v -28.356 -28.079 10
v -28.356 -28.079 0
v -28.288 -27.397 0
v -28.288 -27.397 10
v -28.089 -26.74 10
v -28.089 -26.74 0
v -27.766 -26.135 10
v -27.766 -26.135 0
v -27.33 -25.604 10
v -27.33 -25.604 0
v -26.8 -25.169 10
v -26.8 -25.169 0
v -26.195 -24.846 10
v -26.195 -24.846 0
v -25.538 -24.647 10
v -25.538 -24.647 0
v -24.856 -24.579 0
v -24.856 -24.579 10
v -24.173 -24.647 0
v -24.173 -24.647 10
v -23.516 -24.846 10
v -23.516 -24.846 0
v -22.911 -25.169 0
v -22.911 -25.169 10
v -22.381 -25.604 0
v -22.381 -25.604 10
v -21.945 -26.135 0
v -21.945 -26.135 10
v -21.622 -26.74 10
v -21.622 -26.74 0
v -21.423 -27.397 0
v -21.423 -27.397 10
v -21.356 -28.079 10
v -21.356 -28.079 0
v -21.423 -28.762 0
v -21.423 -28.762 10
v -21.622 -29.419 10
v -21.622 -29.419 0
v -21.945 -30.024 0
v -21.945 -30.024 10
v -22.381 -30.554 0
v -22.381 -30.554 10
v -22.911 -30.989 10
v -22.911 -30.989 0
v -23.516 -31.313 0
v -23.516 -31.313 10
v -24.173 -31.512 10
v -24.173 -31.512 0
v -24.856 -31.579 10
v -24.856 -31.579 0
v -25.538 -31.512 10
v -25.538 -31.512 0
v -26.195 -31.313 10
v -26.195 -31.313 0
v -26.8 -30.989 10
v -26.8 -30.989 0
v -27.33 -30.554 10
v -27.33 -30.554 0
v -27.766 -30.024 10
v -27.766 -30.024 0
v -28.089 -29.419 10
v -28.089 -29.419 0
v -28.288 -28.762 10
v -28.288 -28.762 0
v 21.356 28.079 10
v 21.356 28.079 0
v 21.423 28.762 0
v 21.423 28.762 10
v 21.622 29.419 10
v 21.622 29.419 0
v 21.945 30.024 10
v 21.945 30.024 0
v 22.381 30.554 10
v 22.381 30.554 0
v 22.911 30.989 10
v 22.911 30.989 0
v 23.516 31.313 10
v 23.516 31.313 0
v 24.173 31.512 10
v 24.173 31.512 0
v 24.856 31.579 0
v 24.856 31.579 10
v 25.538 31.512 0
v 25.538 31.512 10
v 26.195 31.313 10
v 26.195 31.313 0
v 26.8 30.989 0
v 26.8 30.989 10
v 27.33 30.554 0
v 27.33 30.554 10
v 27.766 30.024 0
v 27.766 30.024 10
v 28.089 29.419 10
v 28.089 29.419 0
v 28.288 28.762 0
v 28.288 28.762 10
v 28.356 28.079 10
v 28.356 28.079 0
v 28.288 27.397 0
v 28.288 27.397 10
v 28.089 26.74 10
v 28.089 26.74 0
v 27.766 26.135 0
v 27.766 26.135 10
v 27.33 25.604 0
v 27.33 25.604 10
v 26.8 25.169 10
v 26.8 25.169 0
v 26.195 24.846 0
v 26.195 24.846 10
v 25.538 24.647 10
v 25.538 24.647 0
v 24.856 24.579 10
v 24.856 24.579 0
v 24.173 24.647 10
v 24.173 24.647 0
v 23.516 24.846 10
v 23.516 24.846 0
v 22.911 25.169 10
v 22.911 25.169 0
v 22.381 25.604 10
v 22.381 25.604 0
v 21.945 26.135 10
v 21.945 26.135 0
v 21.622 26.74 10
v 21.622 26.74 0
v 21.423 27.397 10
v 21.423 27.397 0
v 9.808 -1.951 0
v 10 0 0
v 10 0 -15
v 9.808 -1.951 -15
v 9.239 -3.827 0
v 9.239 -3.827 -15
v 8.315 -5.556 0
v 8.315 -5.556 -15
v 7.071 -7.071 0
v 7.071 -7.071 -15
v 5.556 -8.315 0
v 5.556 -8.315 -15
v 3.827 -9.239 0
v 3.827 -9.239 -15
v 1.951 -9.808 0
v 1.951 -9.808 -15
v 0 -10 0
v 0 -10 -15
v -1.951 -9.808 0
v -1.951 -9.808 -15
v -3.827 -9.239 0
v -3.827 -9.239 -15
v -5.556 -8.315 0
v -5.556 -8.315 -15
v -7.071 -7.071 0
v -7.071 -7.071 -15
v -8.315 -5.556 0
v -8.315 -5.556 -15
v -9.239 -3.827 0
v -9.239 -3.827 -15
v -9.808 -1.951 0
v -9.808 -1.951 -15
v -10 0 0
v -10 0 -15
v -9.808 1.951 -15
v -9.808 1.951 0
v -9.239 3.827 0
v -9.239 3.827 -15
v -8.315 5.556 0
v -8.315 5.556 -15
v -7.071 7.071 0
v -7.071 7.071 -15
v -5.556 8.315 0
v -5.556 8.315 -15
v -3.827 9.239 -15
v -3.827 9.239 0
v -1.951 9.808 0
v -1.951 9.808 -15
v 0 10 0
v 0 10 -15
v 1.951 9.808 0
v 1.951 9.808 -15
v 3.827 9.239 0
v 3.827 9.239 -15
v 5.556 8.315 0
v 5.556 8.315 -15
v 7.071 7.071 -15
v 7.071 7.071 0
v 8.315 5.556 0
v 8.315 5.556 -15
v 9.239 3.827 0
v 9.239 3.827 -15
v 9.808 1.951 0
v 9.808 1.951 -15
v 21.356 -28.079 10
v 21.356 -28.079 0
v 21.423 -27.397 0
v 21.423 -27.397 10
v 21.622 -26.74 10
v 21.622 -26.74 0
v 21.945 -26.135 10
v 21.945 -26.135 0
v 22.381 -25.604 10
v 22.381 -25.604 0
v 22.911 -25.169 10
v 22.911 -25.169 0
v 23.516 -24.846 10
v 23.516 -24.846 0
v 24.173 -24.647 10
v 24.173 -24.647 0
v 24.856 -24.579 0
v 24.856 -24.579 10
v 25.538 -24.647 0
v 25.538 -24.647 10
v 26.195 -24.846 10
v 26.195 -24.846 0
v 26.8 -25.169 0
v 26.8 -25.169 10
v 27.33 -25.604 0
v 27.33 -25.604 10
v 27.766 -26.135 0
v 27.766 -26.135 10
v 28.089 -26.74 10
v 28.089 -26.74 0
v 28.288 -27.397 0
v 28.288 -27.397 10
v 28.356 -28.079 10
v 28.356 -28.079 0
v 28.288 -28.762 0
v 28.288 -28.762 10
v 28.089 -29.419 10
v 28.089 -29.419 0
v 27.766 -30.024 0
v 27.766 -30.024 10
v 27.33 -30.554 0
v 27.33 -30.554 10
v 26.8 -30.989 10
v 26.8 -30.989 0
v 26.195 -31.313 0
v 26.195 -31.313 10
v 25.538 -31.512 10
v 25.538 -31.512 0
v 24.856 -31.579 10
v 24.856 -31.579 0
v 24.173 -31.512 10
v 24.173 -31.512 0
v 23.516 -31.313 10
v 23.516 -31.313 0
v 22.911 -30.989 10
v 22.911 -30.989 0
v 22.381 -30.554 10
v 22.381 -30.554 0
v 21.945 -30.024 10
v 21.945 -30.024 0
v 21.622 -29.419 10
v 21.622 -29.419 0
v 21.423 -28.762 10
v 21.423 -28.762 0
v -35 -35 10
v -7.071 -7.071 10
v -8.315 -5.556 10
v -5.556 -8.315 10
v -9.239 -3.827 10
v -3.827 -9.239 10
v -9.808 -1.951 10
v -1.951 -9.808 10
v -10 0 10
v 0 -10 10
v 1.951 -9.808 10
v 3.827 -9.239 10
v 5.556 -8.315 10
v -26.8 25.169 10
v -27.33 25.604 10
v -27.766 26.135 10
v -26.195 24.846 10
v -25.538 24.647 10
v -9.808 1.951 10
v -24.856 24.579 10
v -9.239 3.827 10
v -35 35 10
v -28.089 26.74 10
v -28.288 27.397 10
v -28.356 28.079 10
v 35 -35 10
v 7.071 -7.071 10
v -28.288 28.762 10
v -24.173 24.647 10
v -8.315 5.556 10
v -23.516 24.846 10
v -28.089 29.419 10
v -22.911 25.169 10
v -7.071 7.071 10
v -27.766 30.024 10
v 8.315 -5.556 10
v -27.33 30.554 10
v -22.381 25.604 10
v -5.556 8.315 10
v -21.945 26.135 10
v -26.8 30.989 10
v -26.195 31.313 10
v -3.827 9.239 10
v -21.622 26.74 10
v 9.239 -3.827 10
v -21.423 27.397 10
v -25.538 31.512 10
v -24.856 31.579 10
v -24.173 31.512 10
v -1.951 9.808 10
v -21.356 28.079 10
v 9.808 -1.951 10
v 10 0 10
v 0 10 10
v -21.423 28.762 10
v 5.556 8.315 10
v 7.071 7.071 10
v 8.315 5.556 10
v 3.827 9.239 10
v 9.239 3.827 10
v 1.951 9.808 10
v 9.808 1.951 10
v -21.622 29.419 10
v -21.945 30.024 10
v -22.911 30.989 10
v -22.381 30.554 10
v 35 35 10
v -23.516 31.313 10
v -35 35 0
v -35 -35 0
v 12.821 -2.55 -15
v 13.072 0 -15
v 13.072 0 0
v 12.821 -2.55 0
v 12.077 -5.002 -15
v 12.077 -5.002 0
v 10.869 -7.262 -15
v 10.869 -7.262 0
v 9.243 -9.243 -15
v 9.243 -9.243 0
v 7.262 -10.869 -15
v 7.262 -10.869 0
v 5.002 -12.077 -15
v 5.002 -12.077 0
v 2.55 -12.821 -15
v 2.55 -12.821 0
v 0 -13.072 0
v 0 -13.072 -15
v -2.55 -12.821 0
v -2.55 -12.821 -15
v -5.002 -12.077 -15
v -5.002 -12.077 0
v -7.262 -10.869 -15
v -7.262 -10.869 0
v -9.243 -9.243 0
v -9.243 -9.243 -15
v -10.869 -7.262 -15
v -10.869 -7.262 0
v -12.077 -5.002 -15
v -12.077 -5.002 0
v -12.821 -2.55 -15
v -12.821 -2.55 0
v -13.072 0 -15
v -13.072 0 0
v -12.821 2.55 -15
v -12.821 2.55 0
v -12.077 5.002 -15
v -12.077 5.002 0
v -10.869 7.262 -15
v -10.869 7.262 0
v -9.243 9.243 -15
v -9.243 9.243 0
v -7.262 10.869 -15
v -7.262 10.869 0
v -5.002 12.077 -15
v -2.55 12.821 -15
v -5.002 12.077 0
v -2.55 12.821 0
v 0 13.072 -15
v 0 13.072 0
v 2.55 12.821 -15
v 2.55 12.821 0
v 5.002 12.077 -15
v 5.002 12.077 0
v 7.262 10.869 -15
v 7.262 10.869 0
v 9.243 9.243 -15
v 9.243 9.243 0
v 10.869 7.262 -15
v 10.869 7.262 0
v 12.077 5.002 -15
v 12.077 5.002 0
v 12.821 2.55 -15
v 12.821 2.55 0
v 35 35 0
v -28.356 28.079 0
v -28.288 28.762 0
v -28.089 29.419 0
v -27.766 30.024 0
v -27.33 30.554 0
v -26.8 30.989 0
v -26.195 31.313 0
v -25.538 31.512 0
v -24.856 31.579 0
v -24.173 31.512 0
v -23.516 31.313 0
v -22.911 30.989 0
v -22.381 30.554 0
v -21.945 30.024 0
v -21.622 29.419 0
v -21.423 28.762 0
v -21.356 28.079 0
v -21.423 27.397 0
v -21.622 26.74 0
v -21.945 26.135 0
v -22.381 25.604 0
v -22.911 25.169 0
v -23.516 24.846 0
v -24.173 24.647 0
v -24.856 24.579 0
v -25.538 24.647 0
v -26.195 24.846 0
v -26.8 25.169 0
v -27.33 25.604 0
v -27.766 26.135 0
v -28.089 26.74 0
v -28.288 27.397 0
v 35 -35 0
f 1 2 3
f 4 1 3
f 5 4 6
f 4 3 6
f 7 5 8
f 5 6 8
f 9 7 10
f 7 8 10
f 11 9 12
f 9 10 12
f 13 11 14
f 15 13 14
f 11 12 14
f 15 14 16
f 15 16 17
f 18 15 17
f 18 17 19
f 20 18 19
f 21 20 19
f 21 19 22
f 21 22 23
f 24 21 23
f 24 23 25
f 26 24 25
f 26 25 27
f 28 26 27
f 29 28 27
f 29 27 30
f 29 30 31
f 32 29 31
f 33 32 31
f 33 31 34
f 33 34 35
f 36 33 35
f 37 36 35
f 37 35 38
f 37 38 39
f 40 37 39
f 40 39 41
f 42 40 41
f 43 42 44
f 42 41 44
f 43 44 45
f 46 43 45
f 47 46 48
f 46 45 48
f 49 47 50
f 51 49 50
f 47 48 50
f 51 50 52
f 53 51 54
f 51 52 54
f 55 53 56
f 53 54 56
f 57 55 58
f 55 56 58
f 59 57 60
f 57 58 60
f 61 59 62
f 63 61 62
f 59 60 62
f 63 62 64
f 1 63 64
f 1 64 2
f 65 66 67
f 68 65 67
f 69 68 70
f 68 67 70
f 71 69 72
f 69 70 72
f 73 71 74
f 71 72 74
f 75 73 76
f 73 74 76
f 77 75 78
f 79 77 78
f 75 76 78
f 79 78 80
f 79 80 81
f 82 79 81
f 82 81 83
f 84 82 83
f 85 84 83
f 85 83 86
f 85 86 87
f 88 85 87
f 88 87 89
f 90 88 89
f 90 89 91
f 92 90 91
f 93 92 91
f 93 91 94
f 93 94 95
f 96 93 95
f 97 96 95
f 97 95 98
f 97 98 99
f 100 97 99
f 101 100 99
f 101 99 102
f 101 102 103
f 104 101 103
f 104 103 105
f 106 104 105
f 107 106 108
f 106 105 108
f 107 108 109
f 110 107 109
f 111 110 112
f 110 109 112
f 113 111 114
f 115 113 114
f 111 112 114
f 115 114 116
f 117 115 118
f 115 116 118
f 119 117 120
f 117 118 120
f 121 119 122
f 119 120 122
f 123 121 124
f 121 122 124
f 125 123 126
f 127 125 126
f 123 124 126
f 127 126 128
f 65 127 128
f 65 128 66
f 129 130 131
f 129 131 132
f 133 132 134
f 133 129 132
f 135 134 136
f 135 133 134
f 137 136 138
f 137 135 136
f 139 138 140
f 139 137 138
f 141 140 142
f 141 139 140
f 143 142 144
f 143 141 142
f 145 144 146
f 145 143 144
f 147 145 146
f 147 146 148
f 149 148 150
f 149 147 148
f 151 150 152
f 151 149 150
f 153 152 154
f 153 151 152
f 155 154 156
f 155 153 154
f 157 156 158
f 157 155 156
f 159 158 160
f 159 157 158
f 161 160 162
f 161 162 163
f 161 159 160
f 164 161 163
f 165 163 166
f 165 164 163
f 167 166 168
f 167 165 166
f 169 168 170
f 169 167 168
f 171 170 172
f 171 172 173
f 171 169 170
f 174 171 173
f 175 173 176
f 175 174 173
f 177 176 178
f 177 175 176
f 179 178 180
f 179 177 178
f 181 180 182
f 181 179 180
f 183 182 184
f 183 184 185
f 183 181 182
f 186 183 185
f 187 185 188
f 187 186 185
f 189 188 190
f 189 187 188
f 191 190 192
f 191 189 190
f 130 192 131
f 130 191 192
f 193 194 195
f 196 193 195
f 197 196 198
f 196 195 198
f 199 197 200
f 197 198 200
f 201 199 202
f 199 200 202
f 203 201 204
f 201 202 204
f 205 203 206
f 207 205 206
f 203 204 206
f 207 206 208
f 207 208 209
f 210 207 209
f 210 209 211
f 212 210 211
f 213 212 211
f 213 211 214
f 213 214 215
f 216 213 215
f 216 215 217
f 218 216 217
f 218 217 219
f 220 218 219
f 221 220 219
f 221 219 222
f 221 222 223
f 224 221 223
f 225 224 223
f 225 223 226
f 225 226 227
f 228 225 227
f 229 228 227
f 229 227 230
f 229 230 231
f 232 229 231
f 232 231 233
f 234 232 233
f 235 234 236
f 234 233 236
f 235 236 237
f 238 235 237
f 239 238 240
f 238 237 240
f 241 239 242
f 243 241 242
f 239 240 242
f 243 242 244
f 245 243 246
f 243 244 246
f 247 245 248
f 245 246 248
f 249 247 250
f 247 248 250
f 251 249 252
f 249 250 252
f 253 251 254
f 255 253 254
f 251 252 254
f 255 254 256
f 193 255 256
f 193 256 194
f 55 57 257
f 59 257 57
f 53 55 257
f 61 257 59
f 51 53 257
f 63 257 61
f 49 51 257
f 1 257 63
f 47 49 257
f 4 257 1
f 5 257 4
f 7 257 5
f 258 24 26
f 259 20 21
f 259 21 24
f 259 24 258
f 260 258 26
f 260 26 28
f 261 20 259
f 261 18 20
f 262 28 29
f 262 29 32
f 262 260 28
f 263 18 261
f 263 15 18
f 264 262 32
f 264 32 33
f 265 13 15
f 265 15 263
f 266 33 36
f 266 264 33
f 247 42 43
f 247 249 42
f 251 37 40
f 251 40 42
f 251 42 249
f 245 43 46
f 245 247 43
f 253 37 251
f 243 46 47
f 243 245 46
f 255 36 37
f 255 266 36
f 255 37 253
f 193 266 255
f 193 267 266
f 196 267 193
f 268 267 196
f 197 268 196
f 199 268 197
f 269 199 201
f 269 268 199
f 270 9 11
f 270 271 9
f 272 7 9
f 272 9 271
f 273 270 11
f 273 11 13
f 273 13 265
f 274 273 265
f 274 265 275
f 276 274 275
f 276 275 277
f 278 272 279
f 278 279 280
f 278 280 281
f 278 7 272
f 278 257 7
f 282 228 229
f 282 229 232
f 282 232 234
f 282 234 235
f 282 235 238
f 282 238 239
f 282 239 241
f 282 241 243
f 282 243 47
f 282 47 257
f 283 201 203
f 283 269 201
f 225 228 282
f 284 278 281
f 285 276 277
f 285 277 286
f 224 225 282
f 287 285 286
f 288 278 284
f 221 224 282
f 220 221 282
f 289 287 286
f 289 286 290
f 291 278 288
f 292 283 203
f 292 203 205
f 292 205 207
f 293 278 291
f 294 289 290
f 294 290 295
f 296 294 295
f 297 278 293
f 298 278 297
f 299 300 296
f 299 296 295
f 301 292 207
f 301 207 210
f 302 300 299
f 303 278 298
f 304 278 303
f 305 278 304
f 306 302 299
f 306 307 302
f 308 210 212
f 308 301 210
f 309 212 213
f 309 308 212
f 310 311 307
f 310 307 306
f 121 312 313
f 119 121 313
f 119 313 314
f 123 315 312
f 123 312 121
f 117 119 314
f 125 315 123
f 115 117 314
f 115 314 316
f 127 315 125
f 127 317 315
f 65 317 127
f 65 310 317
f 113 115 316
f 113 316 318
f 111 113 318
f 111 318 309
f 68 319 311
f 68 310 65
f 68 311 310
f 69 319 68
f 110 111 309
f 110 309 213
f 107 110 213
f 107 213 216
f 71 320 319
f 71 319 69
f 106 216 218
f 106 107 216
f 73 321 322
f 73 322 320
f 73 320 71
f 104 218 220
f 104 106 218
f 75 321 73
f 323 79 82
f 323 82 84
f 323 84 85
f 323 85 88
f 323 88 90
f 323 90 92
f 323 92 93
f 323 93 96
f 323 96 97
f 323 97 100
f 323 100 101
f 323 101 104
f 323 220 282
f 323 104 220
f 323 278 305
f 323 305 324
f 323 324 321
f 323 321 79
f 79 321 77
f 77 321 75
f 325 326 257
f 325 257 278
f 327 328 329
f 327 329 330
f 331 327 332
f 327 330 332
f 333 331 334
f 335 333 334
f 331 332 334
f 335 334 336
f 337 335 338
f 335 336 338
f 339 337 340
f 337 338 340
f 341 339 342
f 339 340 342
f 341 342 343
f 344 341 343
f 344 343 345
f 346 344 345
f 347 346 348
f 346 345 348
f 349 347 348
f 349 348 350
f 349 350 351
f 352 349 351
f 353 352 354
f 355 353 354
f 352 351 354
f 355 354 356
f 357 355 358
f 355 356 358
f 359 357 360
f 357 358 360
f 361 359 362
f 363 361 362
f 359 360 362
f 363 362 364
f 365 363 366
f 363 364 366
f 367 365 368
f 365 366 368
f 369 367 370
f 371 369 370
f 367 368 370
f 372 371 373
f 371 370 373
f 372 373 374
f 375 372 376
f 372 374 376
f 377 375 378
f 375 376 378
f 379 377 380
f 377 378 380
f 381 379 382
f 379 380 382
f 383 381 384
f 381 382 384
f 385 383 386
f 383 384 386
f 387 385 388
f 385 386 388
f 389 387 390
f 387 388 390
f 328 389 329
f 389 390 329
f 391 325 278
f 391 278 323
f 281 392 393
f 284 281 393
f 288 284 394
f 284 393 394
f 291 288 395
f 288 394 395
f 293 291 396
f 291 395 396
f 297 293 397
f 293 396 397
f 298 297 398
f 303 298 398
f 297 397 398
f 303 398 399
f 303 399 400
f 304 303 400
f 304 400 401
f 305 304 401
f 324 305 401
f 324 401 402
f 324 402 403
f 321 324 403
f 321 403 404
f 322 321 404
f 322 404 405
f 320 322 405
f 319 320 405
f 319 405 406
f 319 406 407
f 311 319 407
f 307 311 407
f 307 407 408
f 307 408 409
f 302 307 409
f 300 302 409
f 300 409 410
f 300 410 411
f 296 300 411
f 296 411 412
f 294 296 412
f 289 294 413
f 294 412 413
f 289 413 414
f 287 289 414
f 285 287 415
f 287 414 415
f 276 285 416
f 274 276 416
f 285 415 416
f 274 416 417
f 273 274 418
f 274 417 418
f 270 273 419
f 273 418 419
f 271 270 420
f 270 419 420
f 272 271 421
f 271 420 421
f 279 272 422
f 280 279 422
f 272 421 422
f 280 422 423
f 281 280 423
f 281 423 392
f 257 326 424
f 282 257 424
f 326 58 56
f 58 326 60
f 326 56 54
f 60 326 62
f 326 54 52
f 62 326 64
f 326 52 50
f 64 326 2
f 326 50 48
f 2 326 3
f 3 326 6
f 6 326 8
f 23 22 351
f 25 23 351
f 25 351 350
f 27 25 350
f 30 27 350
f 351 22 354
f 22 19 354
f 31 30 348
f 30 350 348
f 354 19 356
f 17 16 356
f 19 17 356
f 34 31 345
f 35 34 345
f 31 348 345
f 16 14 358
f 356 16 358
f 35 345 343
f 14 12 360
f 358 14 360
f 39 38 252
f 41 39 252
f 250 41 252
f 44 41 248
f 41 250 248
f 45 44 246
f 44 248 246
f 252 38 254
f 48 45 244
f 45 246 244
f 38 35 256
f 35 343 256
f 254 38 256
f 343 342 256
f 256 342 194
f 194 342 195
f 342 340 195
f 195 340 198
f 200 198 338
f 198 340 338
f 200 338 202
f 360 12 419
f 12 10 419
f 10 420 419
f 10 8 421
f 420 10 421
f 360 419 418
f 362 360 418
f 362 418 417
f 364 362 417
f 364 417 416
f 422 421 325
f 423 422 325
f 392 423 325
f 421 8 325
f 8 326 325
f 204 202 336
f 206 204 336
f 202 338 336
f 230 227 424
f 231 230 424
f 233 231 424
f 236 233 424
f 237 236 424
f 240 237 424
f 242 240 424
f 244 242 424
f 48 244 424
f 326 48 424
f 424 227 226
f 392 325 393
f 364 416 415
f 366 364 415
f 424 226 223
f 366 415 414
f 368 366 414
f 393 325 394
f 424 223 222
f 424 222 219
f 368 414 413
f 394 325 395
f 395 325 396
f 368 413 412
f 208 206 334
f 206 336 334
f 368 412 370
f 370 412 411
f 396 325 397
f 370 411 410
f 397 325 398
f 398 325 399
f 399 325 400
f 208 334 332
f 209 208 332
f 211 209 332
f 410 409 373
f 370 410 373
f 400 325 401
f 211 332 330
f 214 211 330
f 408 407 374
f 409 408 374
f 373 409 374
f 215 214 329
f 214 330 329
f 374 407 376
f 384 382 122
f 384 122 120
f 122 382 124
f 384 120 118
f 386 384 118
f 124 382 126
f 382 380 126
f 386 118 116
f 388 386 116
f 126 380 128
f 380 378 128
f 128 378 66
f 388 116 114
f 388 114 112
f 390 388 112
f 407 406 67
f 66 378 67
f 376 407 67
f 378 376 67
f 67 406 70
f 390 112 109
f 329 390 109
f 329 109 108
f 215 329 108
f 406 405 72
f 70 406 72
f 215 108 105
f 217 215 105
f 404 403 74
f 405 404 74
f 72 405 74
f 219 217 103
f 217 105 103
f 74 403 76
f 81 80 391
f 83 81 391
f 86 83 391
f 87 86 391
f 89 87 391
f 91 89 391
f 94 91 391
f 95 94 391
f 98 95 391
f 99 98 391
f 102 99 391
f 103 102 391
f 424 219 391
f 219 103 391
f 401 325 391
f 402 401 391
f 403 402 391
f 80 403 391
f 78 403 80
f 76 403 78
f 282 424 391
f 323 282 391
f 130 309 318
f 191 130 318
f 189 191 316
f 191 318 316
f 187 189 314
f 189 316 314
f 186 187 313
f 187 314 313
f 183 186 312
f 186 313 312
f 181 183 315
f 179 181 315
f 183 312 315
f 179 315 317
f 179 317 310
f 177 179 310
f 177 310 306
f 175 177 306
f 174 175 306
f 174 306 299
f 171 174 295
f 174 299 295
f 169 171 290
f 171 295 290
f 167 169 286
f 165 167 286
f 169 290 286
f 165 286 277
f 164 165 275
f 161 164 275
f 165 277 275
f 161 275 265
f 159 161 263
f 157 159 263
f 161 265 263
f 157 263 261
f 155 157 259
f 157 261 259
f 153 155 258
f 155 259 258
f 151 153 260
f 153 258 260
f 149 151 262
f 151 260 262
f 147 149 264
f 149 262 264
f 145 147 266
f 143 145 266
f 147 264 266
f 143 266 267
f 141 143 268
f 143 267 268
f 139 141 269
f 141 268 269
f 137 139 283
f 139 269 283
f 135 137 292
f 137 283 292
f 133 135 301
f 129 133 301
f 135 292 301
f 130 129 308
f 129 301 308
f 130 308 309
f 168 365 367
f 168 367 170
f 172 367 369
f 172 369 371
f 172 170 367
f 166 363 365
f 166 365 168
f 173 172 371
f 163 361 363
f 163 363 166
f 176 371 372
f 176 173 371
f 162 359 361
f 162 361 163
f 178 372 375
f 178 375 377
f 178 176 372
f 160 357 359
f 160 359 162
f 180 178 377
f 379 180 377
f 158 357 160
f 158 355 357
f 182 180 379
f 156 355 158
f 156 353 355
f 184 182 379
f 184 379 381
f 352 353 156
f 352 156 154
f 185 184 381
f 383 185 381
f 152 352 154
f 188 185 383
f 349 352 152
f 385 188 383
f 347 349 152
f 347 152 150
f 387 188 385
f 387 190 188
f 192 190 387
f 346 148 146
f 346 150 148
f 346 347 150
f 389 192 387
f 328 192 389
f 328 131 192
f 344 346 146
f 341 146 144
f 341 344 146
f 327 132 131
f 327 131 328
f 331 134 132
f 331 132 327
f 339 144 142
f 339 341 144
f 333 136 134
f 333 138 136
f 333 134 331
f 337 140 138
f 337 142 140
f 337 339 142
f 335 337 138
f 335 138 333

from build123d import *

# Parameters (mm, degrees)
SKETCH1_W           = 70
SKETCH1_H           = 70
BOSS_EXTRUDE1_DEPTH = 10
SKETCH2_R           = 10
CUT_EXTRUDE1_DEPTH  = 10
SKETCH4_R           = 3.5
CUT_EXTRUDE2_DEPTH  = 35
SKETCH5_R           = 13.071961786
SKETCH5_R_2         = 10
BOSS_EXTRUDE3_DEPTH = 15


with BuildPart() as part:
    # Sketch1 → Boss-Extrude1 (new body)
    with BuildSketch(Plane.XY):
        Rectangle(SKETCH1_W, SKETCH1_H)
    extrude(amount=BOSS_EXTRUDE1_DEPTH)

    # Sketch2 → Cut-Extrude1 (cut)
    with BuildSketch(Plane.XY.offset(10)):
        Circle(SKETCH2_R)
    extrude(amount=-CUT_EXTRUDE1_DEPTH, mode=Mode.SUBTRACT)

    # Sketch4 → Cut-Extrude2 (cut)
    with BuildSketch(Plane(origin=(0, 0, 0), x_dir=(-1, 0, 0), z_dir=(0, 0, -1))):
        with Locations((-24.855592085, 28.07934369)):
            Circle(SKETCH4_R)
        with Locations((24.855592085, 28.07934369)):
            Circle(SKETCH4_R)
        with Locations((24.855592085, -28.07934369)):
            Circle(SKETCH4_R)
        with Locations((-24.855592085, -28.07934369)):
            Circle(SKETCH4_R)
    extrude(amount=-CUT_EXTRUDE2_DEPTH, mode=Mode.SUBTRACT)

    # Sketch5 → Boss-Extrude3 (add)
    with BuildSketch(Plane(origin=(0, 0, 0), x_dir=(-1, 0, 0), z_dir=(0, 0, -1))):
        with Locations(Location((0, 0, 0), (0, 0, 180))):
            Circle(SKETCH5_R)
        with Locations(Location((0, 0, 0), (0, 0, 180))):
            Circle(SKETCH5_R_2, mode=Mode.SUBTRACT)
    extrude(amount=BOSS_EXTRUDE3_DEPTH)


solid = part.part
